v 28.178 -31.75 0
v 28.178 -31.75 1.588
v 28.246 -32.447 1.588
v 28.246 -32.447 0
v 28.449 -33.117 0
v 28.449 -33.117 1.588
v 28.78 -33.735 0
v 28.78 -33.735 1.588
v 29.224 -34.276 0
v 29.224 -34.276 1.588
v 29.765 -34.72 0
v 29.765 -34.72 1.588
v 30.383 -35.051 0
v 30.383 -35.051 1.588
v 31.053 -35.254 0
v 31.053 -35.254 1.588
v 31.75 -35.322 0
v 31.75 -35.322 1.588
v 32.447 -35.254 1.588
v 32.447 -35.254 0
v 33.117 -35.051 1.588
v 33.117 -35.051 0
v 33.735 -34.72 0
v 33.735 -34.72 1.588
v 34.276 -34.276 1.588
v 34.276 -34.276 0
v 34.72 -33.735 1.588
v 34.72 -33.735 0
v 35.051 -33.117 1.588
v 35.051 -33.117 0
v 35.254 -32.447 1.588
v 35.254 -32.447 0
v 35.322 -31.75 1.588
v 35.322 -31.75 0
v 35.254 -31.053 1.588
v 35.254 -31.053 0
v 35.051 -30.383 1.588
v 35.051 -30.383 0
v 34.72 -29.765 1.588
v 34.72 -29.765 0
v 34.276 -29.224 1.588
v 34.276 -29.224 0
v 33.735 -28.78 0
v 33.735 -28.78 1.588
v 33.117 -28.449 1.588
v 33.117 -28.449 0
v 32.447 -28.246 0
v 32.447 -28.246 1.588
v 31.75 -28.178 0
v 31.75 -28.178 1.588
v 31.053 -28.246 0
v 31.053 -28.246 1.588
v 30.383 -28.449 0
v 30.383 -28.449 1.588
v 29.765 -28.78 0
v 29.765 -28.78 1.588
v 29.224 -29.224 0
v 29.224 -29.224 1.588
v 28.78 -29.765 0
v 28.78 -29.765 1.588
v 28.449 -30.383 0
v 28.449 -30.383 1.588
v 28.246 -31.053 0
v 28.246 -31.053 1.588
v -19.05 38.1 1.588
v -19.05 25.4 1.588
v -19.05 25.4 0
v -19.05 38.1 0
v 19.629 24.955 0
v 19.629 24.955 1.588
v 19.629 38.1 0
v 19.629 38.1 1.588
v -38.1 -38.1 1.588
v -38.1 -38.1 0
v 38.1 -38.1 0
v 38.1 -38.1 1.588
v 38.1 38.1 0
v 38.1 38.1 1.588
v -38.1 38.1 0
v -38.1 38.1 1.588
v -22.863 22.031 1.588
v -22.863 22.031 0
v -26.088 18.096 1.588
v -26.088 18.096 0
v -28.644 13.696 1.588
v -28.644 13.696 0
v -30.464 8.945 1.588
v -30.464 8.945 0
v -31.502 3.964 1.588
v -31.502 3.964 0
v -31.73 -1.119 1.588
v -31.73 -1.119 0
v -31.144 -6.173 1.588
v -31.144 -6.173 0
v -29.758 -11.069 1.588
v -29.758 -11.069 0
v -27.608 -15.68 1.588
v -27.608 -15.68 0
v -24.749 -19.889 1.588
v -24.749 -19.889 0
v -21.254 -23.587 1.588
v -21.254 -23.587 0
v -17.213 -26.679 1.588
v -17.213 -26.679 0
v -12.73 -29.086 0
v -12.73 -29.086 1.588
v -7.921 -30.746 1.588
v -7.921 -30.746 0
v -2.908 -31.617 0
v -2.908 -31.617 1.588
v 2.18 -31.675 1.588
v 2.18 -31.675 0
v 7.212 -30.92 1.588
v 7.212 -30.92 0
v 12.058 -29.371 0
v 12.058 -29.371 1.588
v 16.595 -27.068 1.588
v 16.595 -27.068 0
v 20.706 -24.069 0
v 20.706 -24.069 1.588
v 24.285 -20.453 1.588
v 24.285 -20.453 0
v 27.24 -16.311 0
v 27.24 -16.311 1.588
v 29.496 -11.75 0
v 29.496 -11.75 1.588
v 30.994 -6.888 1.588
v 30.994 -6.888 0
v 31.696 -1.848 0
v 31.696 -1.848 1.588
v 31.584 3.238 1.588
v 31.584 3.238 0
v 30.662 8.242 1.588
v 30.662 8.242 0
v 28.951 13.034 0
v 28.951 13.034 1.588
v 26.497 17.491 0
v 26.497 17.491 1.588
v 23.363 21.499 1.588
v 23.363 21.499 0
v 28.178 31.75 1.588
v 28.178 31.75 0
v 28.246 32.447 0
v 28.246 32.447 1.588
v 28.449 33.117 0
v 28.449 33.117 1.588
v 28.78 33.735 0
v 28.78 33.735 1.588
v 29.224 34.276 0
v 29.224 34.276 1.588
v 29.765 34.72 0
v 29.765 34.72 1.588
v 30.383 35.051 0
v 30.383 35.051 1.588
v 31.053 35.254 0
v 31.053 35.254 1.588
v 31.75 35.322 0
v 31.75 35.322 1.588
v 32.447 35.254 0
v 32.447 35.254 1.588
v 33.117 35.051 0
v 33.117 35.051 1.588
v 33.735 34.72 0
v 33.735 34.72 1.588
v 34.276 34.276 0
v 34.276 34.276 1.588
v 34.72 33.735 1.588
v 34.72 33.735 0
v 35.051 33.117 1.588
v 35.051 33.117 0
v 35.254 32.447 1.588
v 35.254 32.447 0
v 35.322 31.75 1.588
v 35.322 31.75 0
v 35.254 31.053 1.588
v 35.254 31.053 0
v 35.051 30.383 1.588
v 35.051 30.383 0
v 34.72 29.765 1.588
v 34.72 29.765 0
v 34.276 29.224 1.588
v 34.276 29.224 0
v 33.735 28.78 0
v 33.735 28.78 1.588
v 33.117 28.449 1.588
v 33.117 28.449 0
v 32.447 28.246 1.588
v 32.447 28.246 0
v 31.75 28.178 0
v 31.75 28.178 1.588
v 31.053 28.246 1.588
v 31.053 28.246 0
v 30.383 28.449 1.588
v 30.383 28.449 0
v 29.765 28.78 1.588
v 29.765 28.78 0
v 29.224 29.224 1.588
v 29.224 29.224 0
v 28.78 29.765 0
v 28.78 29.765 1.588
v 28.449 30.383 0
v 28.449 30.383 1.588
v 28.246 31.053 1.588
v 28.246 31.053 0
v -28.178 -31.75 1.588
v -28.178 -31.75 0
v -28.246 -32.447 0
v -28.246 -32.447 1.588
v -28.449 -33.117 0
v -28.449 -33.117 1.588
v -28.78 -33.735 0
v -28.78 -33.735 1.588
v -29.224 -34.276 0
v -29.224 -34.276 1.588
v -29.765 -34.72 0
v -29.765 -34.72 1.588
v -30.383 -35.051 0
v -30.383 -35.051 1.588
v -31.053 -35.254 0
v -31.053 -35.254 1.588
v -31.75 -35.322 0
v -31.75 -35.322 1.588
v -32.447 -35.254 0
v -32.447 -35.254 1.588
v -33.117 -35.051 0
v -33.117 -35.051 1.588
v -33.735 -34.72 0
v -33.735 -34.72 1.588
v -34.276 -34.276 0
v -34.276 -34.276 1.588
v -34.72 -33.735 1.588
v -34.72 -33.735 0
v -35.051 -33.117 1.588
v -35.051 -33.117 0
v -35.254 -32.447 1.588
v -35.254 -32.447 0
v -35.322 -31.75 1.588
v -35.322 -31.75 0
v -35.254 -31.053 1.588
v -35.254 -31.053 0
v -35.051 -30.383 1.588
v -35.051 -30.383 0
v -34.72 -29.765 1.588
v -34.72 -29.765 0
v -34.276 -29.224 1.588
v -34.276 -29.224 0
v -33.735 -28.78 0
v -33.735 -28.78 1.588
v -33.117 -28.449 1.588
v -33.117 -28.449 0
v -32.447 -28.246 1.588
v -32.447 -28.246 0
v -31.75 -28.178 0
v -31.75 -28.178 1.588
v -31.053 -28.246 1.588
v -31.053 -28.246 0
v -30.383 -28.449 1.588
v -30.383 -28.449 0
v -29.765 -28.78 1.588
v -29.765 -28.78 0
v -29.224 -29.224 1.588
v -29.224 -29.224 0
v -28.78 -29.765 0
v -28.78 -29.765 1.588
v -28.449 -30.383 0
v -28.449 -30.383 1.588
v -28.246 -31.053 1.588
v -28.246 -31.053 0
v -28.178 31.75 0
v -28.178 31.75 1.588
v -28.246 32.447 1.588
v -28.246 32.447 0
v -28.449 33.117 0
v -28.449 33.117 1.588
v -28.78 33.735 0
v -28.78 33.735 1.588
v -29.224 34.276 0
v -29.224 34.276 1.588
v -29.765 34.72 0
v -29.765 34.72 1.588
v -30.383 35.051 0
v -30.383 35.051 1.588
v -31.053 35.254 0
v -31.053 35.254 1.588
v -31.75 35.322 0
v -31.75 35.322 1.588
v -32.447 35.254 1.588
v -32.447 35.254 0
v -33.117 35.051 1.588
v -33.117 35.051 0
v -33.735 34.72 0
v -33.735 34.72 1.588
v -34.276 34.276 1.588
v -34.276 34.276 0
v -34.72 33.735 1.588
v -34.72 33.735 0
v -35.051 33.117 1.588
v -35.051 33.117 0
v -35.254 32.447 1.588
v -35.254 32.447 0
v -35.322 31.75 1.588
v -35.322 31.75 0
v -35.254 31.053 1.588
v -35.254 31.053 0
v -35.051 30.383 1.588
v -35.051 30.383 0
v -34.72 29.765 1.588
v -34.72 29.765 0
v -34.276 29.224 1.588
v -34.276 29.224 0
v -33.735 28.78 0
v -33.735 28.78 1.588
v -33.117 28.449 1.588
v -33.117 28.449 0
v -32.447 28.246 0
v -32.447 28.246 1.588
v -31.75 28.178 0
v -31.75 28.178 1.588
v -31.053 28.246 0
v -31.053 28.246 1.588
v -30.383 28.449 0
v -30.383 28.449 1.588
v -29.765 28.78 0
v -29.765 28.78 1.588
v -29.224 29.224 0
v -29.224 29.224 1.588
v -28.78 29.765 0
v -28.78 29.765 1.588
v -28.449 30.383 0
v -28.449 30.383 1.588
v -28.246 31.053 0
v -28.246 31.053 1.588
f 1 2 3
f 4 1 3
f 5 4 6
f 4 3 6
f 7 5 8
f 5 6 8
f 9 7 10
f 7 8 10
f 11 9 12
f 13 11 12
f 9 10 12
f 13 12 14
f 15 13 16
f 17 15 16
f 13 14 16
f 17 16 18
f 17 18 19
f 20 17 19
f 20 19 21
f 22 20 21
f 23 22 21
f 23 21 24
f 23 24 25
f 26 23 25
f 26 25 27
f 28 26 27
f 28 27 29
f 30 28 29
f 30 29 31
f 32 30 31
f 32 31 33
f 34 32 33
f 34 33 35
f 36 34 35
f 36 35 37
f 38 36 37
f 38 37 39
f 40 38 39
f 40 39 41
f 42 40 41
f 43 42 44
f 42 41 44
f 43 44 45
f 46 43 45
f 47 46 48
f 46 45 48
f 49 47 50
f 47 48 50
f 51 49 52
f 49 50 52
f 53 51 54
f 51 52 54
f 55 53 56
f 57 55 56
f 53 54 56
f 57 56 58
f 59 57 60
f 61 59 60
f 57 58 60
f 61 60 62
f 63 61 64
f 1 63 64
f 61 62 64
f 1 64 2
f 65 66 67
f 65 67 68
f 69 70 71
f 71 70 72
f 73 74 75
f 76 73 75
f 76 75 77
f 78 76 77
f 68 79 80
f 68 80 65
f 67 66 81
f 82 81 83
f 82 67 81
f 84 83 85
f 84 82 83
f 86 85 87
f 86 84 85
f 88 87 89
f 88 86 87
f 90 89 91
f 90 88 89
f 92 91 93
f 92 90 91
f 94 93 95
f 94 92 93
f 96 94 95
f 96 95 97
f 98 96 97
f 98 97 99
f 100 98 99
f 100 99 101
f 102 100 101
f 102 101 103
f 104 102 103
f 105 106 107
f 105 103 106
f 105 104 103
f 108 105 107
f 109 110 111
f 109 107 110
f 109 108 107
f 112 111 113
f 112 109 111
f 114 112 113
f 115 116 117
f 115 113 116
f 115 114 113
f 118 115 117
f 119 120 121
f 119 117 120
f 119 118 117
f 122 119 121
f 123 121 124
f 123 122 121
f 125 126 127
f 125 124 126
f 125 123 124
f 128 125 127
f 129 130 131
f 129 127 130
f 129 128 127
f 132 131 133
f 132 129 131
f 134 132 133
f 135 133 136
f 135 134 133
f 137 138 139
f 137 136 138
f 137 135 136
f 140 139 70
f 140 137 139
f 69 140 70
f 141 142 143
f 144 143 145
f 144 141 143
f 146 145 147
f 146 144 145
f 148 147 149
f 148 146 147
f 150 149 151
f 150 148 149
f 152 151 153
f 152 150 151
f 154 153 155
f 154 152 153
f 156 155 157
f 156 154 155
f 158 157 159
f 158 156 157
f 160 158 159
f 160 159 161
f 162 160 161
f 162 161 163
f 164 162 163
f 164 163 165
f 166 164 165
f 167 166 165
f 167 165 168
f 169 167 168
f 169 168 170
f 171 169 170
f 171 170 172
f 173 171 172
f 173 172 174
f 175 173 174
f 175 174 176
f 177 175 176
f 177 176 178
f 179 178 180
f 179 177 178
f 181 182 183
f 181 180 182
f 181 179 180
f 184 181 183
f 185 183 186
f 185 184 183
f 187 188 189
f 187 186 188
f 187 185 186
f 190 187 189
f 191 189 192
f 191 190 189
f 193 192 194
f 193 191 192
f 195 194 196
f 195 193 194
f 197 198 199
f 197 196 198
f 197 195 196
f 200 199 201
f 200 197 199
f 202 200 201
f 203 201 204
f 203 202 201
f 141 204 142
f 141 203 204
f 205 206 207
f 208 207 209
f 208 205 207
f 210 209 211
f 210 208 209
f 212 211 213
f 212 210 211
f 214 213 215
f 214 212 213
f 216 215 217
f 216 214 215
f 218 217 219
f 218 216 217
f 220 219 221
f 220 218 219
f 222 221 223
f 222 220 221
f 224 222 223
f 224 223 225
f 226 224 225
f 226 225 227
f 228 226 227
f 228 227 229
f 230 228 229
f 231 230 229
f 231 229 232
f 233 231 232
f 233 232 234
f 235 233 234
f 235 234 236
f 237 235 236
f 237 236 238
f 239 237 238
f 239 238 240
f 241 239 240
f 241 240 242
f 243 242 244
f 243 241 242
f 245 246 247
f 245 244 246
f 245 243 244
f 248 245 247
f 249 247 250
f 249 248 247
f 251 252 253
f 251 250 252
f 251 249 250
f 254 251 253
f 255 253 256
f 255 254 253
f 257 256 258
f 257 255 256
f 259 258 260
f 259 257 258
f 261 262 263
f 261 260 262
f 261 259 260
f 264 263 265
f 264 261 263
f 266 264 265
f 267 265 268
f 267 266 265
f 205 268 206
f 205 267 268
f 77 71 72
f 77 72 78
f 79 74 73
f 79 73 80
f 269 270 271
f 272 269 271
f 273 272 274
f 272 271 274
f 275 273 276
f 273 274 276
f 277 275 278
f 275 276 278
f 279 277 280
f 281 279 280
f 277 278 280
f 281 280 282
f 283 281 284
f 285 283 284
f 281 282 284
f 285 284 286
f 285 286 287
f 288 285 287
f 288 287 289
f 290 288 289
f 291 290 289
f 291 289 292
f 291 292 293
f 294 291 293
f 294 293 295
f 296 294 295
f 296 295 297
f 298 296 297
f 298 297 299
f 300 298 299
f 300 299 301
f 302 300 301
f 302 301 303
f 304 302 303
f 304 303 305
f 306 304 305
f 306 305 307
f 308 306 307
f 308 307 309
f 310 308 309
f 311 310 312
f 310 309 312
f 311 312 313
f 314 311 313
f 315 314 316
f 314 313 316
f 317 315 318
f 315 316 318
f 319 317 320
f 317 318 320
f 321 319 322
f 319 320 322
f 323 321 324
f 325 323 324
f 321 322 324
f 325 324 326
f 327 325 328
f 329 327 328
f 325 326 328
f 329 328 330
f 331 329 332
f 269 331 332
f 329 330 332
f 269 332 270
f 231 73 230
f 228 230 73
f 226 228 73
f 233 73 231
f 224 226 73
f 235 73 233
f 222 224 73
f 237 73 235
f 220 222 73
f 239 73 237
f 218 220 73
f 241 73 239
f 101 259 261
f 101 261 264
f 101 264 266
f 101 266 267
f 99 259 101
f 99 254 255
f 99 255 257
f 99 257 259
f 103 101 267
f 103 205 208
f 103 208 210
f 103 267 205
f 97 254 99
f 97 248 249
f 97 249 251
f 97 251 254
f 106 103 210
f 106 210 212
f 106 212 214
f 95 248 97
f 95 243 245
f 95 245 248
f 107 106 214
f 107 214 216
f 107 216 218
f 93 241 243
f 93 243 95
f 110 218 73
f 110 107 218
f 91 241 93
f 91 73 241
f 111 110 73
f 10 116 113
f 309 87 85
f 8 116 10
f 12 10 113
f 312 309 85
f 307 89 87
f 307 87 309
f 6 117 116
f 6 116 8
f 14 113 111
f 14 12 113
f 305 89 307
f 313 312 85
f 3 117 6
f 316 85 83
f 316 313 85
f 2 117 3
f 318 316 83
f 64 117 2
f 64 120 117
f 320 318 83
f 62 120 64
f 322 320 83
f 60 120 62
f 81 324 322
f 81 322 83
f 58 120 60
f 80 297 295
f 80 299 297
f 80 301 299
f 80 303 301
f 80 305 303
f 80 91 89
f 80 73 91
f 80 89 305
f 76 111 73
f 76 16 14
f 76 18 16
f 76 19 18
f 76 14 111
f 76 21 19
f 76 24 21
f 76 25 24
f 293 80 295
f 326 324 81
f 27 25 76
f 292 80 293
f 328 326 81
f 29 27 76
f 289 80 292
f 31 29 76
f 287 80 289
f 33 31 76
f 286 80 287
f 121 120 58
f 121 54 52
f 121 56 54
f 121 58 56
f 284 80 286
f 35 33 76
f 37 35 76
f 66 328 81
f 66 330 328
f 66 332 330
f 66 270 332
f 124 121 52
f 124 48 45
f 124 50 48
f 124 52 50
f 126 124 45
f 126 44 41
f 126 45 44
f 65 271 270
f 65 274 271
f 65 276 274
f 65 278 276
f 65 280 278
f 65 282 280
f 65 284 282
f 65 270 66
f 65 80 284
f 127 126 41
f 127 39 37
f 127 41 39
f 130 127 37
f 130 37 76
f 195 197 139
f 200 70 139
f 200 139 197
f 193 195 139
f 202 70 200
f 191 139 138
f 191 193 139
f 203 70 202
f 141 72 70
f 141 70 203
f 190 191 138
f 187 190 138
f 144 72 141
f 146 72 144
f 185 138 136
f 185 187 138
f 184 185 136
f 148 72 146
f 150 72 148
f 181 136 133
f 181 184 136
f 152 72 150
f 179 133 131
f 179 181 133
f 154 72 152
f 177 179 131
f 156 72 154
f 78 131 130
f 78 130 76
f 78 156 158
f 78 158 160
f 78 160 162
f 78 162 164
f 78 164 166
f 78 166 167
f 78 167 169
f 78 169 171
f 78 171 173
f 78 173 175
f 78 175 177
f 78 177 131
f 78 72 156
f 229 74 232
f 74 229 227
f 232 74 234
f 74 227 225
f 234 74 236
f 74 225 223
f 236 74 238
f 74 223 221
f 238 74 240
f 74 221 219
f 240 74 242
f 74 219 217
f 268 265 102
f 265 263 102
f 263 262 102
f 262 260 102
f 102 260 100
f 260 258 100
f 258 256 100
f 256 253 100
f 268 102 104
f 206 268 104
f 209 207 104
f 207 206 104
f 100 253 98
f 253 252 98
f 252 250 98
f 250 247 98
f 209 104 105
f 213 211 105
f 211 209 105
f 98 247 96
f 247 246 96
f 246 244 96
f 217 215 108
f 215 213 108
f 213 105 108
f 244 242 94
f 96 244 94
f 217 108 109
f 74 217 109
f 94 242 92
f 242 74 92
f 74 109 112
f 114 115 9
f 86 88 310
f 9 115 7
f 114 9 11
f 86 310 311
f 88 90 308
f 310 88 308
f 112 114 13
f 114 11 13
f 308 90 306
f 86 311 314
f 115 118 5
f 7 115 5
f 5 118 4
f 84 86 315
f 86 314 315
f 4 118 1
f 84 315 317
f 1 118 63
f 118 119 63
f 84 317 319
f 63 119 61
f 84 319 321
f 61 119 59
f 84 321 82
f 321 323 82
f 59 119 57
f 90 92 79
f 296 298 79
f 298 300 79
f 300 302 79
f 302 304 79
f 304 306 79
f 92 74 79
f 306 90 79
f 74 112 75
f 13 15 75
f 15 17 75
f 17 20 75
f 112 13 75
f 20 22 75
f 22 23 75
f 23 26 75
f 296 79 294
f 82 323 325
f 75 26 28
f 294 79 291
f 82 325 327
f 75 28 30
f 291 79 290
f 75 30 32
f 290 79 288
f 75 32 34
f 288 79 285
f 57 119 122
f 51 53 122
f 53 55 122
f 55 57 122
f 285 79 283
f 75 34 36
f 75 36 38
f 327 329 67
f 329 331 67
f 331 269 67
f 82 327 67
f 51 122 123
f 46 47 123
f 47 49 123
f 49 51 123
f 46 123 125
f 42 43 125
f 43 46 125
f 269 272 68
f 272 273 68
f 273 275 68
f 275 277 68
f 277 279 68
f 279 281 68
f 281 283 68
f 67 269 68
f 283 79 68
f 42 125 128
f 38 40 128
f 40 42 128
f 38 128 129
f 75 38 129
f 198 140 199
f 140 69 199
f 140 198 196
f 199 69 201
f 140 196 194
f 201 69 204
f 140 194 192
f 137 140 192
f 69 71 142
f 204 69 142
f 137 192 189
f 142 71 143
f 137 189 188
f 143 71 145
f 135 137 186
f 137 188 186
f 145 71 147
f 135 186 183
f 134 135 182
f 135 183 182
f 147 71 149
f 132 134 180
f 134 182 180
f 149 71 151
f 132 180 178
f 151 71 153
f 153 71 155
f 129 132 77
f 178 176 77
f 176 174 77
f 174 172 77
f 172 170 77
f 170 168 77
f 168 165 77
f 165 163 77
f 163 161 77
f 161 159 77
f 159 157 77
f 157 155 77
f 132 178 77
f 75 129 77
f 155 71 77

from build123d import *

# Parameters (mm, degrees)
SKETCH1_W               = 76.2
SKETCH1_H               = 76.2
SKETCH1_R               = 31.75
BOSS_EXTRUDE1_DEPTH     = 1.5875
SKETCH2_R               = 3.572453457
CUT_EXTRUDE1_DEPTH      = 3.175
SKETCH5_W               = 38.678922036
SKETCH5_H               = 46.509488783
CUT_EXTRUDE3_DEPTH      = 2.5875
MIRROR2_COPY_1_SKETCH_R = 3.572453457
MIRROR2_COPY_1_DEPTH    = 3.175


with BuildPart() as part:
    # Sketch1 → Boss-Extrude1 (new body)
    with BuildSketch(Plane.XY):
        Rectangle(SKETCH1_W, SKETCH1_H)
        Circle(SKETCH1_R, mode=Mode.SUBTRACT)
    extrude(amount=BOSS_EXTRUDE1_DEPTH)

    # Sketch2 → Cut-Extrude1 (cut)
    with BuildSketch(Plane.XY.offset(1.5875)):
        with Locations((-31.75, 31.75)):
            Circle(SKETCH2_R)
    cut_extrude1 = extrude(amount=-CUT_EXTRUDE1_DEPTH, mode=Mode.SUBTRACT)

    # Sketch5 → Cut-Extrude3 (cut, through all)
    with BuildSketch(Plane.XY.offset(1.5875)):
        with Locations((0.289461018, 41.034744392)):
            Rectangle(SKETCH5_W, SKETCH5_H)
    extrude(amount=-CUT_EXTRUDE3_DEPTH, mode=Mode.SUBTRACT)

    # Mirror1: Cut-Extrude1 across plane
    add(cut_extrude1.mirror(Plane(origin=(0, 0, 0), x_dir=(0, 0, 1), z_dir=(1, 0, 0))), mode=Mode.SUBTRACT)

    # Mirror2: Cut-Extrude1 across plane
    add(cut_extrude1.mirror(Plane.ZX), mode=Mode.SUBTRACT)

    # Mirror2 copy 1 sketch → Mirror2 copy 1 (cut)
    with BuildSketch(Plane(origin=(0, 0, 1.5875), x_dir=(-1, 0, 0), z_dir=(0, 0, 1))):
        with Locations((-31.75, 31.75)):
            Circle(MIRROR2_COPY_1_SKETCH_R)
    extrude(amount=-MIRROR2_COPY_1_DEPTH, mode=Mode.SUBTRACT)


solid = part.part
